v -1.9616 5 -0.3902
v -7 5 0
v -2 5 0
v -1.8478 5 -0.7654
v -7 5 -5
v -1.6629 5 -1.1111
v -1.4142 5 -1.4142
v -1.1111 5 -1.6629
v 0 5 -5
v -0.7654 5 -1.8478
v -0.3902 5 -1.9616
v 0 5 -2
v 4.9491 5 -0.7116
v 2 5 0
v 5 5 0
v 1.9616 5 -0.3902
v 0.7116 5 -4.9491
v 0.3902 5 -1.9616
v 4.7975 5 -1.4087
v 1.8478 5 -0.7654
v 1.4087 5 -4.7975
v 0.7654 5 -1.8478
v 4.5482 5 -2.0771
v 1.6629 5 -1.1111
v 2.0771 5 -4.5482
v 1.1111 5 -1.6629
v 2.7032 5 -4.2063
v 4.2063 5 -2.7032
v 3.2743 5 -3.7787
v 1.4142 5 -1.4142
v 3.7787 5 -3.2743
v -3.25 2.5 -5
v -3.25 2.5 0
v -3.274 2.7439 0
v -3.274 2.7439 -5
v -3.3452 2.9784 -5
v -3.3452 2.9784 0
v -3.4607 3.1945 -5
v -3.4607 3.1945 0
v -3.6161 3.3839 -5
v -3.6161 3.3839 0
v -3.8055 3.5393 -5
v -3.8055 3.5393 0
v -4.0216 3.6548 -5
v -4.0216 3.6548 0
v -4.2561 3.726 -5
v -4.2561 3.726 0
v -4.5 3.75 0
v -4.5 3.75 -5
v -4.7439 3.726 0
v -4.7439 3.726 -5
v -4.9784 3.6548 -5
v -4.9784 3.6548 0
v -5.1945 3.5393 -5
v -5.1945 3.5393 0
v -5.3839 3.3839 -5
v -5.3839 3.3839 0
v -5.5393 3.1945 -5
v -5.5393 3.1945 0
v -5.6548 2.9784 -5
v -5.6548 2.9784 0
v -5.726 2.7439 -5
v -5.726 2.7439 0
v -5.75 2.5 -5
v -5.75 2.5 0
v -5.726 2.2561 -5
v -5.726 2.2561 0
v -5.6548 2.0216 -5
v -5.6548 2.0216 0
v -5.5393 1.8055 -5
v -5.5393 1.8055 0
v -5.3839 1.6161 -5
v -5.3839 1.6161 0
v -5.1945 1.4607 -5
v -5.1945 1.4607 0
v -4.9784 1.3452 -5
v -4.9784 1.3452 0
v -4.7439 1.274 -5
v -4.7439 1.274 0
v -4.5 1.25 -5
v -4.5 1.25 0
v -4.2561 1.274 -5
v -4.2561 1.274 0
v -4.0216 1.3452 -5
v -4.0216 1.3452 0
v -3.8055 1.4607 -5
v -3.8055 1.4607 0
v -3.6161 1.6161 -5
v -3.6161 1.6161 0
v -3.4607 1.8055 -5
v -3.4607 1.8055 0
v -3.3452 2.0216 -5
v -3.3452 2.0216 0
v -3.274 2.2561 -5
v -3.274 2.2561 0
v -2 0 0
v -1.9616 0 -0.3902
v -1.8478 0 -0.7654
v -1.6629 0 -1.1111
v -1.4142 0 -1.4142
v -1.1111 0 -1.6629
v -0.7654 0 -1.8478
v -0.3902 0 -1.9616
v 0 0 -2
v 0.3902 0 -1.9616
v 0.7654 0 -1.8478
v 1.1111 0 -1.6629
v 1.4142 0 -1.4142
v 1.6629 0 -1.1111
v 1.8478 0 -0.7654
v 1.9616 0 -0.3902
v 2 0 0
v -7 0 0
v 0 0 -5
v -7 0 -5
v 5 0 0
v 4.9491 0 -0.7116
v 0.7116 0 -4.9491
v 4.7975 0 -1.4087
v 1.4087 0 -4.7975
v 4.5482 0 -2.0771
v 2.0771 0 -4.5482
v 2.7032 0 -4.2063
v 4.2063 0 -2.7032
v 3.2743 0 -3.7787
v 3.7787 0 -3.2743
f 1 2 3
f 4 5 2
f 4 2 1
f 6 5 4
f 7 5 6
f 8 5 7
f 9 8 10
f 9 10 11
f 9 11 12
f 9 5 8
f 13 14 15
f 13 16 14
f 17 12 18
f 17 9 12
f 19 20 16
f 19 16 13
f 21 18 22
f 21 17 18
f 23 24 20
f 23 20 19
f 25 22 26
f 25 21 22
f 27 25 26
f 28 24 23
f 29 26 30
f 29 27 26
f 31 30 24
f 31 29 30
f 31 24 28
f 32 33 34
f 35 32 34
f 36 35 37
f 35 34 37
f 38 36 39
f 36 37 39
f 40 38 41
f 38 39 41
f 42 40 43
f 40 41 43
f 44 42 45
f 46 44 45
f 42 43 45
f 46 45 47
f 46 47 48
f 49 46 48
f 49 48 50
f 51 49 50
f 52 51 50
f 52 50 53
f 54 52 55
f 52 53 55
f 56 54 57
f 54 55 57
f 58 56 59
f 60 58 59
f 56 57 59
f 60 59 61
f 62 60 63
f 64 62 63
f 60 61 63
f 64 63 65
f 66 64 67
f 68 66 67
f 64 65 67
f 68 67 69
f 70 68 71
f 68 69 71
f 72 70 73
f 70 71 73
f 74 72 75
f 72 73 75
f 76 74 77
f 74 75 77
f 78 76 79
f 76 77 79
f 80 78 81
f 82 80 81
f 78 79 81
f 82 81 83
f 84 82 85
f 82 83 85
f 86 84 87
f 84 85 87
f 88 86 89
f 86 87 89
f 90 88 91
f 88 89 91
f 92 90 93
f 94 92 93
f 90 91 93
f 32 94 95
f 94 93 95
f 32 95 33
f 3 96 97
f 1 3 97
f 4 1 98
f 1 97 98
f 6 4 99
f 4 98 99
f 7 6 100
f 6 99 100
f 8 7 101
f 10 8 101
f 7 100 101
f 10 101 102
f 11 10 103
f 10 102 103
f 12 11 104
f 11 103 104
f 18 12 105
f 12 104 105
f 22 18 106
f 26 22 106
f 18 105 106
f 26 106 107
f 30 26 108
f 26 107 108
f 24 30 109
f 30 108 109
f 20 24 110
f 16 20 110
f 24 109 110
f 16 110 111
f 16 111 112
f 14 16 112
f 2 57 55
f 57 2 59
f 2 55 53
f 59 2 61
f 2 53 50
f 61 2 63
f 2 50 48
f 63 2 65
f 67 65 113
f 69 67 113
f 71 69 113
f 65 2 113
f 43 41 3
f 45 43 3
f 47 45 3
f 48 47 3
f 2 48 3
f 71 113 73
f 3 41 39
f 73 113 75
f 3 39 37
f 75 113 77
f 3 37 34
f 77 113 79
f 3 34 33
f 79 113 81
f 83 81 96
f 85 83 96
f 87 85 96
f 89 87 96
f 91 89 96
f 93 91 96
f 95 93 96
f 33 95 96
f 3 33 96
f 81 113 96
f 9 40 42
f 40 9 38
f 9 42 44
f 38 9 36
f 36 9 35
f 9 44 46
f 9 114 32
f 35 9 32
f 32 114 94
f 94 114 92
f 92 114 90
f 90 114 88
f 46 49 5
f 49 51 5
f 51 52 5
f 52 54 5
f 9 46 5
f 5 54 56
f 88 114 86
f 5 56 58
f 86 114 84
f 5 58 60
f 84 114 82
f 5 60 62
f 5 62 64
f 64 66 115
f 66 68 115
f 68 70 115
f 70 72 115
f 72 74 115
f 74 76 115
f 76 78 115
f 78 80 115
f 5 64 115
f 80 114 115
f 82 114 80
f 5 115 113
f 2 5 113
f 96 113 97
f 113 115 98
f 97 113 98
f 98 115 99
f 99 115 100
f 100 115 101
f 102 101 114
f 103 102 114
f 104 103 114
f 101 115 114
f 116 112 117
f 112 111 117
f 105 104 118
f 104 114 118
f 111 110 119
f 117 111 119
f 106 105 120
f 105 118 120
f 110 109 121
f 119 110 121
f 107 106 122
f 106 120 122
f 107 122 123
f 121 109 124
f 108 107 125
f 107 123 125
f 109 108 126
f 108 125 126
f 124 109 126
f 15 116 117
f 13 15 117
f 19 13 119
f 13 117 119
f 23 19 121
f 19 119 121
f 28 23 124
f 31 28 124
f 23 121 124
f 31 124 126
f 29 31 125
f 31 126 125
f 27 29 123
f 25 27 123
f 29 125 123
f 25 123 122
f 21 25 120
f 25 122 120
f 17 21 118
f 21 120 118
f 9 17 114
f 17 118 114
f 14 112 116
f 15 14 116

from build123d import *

# Parameters (mm, degrees)
EXTRUDE_1_DEPTH     = 5
SKETCH_2_R          = 1.25
CUT_EXTRUDE_1_DEPTH = 5


with BuildPart() as part:
    # Эскиз1 → Бобышка-Вытянуть1 (new body)
    with BuildSketch(Plane(origin=(0, 0, 0), x_dir=(1, 0, 0), z_dir=(0, 1, 0))):
        with BuildLine():
            Line((2, 0), (5, 0))
            ThreePointArc((5, 0), (3.535533906, 3.535533906), (0, 5))
            Line((0, 5), (-7, 5))
            Line((-7, 5), (-7, 0))
            Line((-7, 0), (-2, 0))
            ThreePointArc((-2, 0), (0, 2), (2, 0))
        make_face()
    extrude(amount=EXTRUDE_1_DEPTH)

    # Эскиз2 → Вырез-Вытянуть1 (cut)
    with BuildSketch(Plane.XY):
        with Locations((-4.5, 2.5)):
            Circle(SKETCH_2_R)
    extrude(amount=-CUT_EXTRUDE_1_DEPTH, mode=Mode.SUBTRACT)


solid = part.part
